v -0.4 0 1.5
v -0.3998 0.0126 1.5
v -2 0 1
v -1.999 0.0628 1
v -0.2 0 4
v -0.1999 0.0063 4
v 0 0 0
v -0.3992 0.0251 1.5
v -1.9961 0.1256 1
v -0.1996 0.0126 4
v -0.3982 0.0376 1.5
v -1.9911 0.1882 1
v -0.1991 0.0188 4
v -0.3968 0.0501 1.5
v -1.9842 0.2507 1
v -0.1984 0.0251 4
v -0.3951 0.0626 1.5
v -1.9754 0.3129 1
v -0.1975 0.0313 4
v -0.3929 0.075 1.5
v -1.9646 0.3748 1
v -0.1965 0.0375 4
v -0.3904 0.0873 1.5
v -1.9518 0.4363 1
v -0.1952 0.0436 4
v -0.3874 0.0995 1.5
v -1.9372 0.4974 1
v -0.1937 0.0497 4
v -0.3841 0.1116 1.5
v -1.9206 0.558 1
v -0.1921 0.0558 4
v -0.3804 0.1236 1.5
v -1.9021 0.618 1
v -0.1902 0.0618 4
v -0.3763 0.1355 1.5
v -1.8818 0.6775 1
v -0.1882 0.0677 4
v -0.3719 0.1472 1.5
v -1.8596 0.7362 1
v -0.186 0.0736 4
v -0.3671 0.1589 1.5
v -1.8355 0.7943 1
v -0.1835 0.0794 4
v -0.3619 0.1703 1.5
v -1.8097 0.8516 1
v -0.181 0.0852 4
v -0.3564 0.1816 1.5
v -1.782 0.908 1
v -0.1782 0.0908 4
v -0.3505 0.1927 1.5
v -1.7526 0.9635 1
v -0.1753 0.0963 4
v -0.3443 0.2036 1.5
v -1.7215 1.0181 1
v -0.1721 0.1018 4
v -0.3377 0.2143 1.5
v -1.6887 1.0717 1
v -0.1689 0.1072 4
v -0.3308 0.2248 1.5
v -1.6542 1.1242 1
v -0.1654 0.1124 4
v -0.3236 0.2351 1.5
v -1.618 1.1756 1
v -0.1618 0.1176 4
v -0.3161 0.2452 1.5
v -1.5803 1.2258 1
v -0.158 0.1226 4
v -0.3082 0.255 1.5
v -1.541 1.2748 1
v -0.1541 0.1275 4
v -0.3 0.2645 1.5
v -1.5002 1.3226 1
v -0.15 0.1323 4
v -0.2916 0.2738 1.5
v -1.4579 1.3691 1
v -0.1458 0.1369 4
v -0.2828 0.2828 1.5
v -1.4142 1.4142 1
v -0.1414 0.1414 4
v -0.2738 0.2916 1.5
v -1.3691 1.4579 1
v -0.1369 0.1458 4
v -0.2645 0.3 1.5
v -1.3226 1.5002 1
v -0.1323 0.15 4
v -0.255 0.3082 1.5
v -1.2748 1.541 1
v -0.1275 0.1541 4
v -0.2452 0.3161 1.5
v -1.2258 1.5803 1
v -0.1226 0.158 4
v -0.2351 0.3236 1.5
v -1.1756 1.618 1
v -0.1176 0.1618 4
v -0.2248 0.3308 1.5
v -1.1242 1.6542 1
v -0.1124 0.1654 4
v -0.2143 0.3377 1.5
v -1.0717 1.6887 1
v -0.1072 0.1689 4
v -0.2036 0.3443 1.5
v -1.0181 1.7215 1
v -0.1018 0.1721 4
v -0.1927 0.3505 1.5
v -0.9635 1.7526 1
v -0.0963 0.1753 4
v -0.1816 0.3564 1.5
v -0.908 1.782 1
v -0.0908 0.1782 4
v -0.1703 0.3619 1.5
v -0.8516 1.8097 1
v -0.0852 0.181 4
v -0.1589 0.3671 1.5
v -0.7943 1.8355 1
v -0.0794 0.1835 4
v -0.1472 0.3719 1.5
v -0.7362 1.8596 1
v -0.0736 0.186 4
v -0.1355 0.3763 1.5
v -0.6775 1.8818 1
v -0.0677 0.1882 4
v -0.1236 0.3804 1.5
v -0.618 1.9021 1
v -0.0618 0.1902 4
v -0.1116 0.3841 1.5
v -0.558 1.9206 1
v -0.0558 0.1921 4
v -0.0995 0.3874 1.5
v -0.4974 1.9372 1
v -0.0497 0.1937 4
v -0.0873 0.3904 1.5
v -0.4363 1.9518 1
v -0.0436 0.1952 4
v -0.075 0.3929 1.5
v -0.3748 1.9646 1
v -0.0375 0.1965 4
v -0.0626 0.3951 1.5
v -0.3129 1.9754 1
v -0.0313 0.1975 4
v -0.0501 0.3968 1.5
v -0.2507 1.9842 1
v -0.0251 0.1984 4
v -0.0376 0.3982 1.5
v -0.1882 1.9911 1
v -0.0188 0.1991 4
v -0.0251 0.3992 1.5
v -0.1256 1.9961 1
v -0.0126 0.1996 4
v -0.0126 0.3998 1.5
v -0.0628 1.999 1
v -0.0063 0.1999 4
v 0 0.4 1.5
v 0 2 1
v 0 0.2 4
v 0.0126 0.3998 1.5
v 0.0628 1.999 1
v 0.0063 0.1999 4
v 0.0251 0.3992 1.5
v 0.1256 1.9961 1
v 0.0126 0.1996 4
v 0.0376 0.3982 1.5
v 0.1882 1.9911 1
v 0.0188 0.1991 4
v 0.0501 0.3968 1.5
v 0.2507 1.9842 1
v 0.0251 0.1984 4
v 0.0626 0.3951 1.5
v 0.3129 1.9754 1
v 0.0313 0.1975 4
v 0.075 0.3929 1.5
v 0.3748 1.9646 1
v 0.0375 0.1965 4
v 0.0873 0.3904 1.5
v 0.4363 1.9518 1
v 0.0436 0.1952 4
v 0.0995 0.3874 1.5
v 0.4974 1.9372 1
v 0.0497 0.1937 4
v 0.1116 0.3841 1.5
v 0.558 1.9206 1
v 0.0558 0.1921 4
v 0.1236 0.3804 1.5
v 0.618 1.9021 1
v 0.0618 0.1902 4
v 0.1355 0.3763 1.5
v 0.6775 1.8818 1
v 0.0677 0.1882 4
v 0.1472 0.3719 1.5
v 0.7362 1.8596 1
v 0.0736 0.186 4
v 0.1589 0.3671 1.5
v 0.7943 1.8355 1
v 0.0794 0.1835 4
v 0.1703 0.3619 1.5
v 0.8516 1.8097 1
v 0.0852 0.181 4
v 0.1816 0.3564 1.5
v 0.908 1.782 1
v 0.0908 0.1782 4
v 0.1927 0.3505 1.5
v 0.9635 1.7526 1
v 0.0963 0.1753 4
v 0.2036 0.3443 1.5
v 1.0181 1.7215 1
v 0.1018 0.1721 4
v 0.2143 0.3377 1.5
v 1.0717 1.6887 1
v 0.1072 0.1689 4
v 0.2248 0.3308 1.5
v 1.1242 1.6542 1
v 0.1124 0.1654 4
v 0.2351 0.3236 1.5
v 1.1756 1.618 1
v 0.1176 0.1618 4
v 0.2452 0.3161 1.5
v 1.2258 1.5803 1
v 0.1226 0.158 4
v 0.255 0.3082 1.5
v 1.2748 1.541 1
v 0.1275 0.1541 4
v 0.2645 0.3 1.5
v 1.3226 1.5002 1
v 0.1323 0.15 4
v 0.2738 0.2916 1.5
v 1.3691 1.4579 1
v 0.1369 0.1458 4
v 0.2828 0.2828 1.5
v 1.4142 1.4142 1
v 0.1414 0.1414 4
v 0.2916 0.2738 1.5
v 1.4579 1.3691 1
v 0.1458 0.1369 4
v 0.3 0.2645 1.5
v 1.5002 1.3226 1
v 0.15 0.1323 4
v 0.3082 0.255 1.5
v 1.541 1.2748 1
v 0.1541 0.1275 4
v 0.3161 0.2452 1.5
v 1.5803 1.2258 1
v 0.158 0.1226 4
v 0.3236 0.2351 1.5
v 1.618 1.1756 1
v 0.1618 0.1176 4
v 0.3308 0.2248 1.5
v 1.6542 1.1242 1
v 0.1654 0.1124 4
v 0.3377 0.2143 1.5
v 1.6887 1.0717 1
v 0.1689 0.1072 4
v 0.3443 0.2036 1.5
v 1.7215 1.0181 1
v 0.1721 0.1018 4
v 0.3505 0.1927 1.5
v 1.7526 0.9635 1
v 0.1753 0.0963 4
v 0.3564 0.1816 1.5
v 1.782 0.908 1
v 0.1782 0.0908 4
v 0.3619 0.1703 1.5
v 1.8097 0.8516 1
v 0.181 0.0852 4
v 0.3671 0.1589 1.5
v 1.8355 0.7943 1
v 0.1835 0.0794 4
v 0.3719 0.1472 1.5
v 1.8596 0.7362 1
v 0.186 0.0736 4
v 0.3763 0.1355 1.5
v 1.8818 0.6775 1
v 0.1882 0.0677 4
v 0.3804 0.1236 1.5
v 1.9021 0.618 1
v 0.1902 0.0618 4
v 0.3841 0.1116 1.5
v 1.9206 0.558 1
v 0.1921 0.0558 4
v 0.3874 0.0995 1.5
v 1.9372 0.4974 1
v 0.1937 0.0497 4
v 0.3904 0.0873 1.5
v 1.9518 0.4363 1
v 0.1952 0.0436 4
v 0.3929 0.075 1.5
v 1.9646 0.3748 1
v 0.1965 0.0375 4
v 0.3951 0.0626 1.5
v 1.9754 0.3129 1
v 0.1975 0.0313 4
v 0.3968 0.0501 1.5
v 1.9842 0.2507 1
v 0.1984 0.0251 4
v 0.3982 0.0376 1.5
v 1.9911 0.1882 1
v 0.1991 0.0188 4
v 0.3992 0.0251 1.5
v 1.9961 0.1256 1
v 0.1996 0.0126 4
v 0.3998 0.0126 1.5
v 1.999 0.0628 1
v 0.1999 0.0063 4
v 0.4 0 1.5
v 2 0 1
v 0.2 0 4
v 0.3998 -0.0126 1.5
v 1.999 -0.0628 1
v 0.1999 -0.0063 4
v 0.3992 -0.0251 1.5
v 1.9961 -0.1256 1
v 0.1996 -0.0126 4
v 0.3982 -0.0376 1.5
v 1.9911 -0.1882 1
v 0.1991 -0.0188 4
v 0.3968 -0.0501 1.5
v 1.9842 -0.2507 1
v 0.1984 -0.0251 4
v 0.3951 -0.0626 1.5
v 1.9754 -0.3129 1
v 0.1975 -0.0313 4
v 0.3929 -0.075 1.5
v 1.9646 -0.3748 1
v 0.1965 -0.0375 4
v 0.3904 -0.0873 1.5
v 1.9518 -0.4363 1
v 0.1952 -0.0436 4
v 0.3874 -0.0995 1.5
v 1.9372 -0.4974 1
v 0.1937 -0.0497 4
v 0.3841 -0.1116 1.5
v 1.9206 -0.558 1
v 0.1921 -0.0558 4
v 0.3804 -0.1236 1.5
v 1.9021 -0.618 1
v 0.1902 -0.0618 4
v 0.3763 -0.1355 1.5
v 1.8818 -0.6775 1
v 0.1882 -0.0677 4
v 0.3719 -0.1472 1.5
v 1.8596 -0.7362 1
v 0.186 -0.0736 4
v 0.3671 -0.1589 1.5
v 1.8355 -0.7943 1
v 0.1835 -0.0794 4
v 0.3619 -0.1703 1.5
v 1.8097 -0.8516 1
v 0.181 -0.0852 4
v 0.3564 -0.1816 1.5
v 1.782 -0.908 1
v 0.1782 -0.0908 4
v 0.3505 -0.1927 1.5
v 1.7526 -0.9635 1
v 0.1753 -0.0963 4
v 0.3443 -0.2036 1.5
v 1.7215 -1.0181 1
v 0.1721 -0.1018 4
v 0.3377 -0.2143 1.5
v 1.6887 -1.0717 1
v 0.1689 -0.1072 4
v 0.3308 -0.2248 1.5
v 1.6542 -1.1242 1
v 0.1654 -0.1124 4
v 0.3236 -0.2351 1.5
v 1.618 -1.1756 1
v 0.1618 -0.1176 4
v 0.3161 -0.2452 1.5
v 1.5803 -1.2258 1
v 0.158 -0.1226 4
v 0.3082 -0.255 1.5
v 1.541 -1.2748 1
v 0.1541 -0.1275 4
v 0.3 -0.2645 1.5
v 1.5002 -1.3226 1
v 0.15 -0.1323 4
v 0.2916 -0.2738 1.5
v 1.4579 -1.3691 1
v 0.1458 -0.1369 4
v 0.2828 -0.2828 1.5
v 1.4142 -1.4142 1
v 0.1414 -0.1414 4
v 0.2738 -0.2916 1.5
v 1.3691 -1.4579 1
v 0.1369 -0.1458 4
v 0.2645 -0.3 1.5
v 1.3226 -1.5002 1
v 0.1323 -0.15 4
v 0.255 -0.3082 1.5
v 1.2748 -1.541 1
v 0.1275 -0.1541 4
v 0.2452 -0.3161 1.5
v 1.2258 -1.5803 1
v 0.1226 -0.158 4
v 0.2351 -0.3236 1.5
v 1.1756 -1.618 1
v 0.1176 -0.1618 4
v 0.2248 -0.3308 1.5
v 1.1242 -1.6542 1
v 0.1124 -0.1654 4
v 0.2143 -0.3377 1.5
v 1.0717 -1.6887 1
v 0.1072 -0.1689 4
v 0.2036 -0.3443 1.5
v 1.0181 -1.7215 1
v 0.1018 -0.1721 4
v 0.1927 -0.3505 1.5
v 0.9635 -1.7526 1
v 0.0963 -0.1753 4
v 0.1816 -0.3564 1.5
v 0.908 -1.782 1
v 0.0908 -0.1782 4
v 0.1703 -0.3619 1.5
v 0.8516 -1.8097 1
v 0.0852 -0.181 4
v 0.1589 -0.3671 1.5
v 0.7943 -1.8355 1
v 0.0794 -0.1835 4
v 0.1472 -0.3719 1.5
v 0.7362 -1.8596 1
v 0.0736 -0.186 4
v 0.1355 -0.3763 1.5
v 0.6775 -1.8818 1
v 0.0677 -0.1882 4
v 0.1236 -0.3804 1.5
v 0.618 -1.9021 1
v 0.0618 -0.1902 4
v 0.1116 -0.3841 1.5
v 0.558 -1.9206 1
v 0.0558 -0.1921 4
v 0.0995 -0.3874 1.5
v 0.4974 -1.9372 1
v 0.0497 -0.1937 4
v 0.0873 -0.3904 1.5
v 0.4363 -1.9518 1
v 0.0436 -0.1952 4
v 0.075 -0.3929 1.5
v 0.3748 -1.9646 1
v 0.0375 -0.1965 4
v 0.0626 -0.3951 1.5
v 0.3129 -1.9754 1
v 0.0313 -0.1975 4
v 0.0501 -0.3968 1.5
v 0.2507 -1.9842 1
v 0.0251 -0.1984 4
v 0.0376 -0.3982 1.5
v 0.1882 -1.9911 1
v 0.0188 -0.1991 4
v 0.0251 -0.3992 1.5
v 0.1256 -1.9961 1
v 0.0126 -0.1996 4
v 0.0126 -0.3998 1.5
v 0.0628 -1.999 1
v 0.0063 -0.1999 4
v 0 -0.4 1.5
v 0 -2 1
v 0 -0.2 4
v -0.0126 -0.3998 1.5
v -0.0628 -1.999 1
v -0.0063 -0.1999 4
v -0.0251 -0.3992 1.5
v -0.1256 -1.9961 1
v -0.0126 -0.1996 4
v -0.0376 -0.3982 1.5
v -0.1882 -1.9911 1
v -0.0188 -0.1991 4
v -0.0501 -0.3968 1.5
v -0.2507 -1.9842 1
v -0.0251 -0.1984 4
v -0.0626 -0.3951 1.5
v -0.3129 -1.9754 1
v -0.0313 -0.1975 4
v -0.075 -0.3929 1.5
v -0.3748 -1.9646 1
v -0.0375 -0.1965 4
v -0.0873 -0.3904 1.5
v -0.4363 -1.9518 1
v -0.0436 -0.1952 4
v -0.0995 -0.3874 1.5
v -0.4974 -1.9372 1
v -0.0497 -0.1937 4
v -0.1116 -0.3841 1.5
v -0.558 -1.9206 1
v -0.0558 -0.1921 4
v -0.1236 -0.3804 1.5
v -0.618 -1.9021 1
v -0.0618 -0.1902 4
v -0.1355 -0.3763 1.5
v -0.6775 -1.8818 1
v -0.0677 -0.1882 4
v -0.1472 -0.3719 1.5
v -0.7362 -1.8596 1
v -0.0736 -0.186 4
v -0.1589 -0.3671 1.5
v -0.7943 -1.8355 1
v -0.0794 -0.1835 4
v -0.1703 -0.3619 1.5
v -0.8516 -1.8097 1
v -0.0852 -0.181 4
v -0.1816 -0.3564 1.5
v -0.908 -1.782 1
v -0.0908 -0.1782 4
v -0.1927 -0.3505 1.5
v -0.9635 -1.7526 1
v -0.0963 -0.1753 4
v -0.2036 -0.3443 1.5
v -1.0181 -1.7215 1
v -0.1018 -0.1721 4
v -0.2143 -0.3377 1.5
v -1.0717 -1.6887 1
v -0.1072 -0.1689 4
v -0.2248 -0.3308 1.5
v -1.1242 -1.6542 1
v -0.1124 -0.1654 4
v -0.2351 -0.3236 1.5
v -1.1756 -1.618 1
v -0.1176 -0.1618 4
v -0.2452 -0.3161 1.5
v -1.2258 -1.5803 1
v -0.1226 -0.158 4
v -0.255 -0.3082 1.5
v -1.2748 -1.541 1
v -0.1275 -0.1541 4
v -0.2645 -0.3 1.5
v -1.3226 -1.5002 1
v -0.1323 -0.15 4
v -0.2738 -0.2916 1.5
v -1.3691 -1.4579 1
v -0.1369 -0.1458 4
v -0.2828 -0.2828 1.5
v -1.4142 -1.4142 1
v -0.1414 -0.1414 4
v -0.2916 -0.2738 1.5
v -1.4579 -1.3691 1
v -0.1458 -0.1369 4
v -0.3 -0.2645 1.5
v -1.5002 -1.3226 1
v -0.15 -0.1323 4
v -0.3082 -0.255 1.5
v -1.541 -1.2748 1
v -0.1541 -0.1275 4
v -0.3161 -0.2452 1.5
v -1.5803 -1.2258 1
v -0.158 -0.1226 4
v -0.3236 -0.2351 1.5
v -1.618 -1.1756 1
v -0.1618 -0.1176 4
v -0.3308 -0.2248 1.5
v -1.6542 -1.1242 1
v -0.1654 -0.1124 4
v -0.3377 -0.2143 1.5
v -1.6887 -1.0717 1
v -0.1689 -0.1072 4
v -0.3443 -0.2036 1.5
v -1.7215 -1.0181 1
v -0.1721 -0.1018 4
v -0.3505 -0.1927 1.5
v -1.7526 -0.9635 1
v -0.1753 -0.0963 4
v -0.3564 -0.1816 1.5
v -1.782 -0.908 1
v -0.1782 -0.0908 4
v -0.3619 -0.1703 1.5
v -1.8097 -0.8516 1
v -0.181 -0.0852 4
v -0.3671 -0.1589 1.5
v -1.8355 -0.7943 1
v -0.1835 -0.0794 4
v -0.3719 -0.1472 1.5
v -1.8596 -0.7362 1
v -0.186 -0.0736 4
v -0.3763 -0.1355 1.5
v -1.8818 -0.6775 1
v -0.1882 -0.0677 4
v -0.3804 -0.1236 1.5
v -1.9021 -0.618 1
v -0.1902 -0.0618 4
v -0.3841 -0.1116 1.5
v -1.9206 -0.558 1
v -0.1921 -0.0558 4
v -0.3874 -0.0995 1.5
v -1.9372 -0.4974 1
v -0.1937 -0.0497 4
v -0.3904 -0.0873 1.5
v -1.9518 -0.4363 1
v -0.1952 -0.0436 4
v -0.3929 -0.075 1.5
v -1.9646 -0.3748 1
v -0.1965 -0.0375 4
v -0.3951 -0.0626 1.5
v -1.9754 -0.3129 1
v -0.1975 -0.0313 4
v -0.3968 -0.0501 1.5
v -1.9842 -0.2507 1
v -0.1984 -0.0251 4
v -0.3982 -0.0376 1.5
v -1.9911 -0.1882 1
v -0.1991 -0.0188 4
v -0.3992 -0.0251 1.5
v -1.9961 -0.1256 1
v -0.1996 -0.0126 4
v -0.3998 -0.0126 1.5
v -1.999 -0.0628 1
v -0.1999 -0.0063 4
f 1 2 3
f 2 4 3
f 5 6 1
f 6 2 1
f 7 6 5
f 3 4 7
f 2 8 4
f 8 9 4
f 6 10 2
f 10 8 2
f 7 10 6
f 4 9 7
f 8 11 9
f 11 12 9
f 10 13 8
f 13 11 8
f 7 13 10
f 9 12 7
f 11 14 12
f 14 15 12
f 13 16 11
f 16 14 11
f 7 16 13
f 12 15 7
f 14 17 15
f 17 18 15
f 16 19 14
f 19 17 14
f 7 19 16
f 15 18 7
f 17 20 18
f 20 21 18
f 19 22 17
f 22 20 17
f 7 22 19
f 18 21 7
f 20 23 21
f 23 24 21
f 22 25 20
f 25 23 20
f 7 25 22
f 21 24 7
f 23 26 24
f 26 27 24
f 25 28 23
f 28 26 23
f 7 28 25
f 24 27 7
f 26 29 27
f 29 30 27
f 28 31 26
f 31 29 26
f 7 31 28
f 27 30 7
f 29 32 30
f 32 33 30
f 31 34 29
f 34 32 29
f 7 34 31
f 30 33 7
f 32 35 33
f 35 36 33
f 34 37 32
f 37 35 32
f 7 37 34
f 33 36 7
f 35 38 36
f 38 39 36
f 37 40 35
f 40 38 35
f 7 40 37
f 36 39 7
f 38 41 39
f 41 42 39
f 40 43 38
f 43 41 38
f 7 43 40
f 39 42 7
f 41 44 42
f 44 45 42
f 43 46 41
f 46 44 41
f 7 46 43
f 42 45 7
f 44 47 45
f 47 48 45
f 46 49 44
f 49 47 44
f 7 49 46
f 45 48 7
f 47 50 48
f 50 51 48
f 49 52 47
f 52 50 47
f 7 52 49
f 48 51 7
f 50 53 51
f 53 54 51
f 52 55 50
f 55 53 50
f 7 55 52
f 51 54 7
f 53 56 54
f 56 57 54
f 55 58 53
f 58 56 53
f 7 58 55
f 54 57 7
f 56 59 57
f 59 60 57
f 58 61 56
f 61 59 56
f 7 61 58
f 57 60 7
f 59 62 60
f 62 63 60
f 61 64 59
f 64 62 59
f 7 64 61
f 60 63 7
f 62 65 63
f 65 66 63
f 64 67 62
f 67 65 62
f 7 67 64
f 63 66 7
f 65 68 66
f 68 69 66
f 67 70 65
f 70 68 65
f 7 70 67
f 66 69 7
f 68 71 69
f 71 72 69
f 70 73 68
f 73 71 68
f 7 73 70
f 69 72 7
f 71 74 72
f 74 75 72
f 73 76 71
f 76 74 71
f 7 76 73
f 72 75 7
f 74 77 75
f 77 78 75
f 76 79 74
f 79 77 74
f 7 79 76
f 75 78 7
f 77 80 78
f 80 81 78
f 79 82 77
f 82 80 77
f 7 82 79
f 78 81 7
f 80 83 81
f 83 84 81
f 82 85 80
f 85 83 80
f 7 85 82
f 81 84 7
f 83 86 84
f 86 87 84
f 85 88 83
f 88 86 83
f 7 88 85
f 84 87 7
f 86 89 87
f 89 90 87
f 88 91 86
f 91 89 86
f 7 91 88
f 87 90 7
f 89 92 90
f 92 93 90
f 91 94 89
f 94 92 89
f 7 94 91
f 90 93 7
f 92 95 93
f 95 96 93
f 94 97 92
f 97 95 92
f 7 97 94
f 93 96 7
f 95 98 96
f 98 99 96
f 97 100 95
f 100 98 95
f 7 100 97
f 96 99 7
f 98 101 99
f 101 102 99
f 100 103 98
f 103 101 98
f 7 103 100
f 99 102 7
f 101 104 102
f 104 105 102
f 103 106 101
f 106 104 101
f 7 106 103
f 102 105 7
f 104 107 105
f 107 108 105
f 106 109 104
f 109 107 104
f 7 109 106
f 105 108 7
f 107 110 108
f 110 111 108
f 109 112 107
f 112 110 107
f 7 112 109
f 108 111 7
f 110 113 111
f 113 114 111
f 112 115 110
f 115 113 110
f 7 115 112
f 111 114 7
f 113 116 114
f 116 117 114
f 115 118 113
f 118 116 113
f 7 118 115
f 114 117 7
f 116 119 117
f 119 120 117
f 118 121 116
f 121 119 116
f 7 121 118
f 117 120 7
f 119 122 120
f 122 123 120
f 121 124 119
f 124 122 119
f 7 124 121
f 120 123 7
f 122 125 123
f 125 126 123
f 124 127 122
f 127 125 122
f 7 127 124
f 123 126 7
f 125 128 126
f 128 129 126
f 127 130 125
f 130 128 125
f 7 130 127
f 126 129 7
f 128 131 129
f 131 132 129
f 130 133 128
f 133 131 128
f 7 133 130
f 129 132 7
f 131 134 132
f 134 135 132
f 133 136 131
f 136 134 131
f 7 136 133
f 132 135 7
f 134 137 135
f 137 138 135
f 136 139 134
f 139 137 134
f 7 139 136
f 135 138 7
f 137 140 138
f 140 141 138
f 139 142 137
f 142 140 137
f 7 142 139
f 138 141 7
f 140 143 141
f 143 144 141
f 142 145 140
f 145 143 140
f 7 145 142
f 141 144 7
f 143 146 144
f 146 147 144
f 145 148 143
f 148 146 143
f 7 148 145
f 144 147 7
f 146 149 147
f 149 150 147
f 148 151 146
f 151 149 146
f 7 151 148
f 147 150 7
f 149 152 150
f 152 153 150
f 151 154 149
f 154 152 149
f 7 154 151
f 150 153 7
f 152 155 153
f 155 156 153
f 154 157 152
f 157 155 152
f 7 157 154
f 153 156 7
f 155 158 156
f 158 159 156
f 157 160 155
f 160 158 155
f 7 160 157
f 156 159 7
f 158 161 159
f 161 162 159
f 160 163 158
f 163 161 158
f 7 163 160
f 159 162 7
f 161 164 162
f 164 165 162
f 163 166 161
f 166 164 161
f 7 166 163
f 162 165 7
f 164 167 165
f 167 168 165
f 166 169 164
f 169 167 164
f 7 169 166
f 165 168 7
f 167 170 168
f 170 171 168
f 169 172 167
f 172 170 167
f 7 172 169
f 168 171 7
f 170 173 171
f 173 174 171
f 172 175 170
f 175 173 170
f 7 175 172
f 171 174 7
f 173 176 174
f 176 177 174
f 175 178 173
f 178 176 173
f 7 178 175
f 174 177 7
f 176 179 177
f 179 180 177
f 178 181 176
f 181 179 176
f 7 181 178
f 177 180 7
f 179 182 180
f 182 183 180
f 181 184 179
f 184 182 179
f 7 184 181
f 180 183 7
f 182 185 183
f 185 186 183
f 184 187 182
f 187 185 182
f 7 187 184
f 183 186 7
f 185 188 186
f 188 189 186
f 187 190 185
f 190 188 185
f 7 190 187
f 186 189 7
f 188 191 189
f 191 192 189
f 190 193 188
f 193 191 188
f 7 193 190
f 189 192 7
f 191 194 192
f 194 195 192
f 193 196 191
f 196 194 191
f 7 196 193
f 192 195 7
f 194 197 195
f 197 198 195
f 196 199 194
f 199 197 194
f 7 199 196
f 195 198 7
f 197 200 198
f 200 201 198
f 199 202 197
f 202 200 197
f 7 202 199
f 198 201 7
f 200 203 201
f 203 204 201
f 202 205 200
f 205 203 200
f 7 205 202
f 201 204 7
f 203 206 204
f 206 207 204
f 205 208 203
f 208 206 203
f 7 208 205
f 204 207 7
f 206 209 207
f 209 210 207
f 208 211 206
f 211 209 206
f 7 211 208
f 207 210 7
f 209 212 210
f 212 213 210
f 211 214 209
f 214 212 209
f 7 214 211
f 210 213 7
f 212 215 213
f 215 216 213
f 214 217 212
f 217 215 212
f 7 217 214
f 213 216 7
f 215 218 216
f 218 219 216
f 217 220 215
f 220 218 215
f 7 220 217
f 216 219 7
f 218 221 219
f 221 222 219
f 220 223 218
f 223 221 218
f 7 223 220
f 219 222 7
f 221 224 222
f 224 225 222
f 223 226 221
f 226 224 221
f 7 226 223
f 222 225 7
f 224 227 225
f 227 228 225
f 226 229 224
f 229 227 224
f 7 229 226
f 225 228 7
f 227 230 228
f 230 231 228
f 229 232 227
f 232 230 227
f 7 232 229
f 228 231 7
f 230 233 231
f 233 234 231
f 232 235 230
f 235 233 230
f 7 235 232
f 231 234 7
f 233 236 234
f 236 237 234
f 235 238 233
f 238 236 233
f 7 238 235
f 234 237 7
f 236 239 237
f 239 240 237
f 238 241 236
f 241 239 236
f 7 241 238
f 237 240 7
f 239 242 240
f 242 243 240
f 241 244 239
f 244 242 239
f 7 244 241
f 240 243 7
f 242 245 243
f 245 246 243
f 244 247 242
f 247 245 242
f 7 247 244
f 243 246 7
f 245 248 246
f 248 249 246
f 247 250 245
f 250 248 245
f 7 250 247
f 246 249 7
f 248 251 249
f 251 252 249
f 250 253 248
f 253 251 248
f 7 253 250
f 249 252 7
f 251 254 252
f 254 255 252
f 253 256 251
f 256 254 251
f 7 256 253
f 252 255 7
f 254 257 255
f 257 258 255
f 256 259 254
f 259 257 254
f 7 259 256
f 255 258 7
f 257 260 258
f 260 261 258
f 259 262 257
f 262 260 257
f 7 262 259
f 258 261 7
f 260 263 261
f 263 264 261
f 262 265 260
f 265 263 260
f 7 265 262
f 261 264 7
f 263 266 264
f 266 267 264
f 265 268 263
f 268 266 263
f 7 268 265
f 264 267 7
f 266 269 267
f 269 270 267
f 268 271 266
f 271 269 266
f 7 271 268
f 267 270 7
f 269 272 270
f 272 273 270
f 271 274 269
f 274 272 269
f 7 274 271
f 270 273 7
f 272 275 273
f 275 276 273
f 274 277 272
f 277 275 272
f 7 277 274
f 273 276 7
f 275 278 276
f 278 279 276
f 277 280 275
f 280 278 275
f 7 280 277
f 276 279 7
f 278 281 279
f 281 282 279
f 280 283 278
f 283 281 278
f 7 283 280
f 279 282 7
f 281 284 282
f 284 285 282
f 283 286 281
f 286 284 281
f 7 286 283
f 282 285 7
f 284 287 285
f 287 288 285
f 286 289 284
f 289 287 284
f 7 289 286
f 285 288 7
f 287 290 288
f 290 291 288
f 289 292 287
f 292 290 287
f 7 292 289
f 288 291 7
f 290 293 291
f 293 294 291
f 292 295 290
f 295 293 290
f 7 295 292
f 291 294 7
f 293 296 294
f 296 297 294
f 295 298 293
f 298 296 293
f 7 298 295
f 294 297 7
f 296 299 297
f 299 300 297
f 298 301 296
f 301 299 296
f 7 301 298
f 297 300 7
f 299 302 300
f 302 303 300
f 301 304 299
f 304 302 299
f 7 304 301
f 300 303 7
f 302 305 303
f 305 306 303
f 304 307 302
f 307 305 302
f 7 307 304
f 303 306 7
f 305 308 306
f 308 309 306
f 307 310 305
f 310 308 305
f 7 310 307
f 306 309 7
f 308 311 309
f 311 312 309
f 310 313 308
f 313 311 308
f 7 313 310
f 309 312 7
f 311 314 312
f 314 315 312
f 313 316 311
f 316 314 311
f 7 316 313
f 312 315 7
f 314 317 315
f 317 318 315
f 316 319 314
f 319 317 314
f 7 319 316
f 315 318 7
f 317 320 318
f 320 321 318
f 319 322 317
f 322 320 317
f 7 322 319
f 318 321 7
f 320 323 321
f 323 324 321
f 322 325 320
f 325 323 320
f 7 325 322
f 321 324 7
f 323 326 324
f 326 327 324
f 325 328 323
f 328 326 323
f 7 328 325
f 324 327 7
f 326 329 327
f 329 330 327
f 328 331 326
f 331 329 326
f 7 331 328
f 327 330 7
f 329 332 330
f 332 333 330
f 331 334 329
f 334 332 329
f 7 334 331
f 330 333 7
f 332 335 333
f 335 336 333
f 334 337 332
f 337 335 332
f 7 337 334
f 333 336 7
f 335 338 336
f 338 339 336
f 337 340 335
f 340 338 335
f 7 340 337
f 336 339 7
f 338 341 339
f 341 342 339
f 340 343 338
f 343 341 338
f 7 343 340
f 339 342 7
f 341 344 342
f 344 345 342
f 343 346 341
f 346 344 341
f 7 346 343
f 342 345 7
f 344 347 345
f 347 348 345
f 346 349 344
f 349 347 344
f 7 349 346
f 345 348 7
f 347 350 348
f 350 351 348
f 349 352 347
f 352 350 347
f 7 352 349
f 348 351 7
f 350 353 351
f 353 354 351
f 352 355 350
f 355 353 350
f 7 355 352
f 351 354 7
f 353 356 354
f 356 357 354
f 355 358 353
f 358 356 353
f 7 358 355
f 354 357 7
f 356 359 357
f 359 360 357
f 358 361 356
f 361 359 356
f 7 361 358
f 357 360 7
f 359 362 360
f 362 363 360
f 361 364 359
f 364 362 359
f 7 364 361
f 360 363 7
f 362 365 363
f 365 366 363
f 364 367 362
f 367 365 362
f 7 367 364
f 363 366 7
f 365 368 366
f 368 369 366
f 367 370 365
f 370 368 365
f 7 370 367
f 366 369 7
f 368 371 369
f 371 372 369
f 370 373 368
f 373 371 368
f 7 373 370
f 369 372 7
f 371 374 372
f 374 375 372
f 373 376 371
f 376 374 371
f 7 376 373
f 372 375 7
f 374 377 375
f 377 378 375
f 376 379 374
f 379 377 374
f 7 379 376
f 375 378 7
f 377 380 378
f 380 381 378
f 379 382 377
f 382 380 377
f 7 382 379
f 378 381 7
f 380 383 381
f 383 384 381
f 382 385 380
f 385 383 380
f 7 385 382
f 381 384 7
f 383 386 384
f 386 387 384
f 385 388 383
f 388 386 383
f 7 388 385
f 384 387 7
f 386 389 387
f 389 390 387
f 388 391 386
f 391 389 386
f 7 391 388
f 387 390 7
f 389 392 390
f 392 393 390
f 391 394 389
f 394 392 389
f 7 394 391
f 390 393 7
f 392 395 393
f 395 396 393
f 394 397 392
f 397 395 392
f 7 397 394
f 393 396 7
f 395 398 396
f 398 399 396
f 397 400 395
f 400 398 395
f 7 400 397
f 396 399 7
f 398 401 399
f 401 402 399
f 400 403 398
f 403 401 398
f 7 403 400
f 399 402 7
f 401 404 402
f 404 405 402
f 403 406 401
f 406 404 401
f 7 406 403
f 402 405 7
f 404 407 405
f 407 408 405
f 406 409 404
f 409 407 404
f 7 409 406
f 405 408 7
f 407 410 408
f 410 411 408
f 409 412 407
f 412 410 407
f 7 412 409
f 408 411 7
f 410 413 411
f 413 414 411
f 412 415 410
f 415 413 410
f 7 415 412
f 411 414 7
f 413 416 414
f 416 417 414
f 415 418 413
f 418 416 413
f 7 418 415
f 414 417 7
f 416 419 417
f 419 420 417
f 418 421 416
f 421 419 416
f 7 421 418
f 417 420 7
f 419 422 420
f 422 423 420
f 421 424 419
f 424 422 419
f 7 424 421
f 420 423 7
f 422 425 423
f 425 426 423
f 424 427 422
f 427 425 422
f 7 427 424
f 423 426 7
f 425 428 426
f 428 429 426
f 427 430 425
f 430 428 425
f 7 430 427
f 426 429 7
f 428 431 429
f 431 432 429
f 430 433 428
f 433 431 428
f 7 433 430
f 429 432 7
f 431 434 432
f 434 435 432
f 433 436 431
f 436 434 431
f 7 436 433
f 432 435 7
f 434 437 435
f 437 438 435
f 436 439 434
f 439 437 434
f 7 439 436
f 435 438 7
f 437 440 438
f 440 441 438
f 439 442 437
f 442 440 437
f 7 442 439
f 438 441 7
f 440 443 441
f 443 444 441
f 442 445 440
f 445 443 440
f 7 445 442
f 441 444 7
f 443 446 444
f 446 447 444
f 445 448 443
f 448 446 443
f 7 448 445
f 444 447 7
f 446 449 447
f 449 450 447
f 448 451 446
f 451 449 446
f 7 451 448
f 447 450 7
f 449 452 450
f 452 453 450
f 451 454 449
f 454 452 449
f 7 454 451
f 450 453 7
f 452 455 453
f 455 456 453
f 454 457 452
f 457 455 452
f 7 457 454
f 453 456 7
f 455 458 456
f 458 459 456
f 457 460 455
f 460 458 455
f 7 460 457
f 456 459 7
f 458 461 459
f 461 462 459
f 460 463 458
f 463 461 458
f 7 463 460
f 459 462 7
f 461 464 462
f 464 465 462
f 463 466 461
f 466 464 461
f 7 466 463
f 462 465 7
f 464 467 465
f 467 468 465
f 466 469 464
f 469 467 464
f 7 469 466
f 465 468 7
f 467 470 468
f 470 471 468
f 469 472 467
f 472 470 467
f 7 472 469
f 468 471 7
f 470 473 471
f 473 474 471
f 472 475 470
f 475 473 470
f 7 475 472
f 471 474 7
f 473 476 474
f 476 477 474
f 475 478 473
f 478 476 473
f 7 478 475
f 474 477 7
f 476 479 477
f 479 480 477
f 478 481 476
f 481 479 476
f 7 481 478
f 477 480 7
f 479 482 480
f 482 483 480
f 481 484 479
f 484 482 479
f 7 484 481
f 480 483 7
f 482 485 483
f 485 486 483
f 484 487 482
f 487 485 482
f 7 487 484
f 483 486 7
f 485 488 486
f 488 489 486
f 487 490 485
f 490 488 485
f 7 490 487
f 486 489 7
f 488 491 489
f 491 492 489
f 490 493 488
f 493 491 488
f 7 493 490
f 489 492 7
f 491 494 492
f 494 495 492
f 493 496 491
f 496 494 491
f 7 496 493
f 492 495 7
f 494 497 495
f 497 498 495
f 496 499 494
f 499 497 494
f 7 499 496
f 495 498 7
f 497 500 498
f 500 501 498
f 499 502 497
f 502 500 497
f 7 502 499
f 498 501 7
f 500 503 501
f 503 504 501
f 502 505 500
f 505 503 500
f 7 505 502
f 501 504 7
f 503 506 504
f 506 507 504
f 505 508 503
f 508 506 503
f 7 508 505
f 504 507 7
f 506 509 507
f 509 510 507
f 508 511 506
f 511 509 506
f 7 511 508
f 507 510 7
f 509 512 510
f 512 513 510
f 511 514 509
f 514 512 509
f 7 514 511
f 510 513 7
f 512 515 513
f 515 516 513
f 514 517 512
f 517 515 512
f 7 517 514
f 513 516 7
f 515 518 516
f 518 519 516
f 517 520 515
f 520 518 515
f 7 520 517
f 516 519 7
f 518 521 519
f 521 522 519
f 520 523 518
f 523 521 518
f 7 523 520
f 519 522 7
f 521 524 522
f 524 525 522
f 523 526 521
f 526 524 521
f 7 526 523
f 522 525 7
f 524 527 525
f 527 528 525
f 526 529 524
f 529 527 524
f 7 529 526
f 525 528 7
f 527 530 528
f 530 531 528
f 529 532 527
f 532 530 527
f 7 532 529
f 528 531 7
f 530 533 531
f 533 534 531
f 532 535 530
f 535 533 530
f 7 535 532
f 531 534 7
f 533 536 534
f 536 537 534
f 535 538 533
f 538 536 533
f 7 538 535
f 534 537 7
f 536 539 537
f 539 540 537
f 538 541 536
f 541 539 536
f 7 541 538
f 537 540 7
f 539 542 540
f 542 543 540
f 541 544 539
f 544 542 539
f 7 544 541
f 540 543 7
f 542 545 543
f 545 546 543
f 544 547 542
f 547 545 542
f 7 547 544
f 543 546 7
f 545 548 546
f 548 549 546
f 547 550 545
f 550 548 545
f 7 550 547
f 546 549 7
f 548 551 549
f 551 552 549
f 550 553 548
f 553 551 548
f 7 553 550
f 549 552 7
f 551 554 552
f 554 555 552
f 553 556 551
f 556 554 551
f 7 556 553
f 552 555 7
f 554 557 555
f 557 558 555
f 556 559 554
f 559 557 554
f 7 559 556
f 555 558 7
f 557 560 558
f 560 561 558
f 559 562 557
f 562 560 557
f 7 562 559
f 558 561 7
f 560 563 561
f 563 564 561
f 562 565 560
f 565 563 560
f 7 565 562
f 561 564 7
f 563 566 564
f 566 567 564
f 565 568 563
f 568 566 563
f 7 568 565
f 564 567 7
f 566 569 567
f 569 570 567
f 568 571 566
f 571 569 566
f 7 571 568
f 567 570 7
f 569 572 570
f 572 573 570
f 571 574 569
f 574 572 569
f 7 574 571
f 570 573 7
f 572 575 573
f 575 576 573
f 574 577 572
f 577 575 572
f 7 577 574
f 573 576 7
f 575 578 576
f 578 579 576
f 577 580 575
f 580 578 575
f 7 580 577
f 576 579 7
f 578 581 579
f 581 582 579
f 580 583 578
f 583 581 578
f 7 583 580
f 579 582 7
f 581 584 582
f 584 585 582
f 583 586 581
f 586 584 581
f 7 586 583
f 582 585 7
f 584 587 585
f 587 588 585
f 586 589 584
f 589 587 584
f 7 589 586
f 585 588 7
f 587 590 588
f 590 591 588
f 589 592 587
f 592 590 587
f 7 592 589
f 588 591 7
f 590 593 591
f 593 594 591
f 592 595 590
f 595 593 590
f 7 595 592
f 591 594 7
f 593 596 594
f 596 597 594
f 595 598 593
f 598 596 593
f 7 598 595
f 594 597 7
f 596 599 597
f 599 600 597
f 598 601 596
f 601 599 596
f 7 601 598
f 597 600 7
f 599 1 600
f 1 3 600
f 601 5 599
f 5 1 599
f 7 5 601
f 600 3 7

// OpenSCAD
rotate_extrude($fn=200) 
 polygon( points=[[0,0],[2,1],[0.4,1.5],[0.2,4]] );
